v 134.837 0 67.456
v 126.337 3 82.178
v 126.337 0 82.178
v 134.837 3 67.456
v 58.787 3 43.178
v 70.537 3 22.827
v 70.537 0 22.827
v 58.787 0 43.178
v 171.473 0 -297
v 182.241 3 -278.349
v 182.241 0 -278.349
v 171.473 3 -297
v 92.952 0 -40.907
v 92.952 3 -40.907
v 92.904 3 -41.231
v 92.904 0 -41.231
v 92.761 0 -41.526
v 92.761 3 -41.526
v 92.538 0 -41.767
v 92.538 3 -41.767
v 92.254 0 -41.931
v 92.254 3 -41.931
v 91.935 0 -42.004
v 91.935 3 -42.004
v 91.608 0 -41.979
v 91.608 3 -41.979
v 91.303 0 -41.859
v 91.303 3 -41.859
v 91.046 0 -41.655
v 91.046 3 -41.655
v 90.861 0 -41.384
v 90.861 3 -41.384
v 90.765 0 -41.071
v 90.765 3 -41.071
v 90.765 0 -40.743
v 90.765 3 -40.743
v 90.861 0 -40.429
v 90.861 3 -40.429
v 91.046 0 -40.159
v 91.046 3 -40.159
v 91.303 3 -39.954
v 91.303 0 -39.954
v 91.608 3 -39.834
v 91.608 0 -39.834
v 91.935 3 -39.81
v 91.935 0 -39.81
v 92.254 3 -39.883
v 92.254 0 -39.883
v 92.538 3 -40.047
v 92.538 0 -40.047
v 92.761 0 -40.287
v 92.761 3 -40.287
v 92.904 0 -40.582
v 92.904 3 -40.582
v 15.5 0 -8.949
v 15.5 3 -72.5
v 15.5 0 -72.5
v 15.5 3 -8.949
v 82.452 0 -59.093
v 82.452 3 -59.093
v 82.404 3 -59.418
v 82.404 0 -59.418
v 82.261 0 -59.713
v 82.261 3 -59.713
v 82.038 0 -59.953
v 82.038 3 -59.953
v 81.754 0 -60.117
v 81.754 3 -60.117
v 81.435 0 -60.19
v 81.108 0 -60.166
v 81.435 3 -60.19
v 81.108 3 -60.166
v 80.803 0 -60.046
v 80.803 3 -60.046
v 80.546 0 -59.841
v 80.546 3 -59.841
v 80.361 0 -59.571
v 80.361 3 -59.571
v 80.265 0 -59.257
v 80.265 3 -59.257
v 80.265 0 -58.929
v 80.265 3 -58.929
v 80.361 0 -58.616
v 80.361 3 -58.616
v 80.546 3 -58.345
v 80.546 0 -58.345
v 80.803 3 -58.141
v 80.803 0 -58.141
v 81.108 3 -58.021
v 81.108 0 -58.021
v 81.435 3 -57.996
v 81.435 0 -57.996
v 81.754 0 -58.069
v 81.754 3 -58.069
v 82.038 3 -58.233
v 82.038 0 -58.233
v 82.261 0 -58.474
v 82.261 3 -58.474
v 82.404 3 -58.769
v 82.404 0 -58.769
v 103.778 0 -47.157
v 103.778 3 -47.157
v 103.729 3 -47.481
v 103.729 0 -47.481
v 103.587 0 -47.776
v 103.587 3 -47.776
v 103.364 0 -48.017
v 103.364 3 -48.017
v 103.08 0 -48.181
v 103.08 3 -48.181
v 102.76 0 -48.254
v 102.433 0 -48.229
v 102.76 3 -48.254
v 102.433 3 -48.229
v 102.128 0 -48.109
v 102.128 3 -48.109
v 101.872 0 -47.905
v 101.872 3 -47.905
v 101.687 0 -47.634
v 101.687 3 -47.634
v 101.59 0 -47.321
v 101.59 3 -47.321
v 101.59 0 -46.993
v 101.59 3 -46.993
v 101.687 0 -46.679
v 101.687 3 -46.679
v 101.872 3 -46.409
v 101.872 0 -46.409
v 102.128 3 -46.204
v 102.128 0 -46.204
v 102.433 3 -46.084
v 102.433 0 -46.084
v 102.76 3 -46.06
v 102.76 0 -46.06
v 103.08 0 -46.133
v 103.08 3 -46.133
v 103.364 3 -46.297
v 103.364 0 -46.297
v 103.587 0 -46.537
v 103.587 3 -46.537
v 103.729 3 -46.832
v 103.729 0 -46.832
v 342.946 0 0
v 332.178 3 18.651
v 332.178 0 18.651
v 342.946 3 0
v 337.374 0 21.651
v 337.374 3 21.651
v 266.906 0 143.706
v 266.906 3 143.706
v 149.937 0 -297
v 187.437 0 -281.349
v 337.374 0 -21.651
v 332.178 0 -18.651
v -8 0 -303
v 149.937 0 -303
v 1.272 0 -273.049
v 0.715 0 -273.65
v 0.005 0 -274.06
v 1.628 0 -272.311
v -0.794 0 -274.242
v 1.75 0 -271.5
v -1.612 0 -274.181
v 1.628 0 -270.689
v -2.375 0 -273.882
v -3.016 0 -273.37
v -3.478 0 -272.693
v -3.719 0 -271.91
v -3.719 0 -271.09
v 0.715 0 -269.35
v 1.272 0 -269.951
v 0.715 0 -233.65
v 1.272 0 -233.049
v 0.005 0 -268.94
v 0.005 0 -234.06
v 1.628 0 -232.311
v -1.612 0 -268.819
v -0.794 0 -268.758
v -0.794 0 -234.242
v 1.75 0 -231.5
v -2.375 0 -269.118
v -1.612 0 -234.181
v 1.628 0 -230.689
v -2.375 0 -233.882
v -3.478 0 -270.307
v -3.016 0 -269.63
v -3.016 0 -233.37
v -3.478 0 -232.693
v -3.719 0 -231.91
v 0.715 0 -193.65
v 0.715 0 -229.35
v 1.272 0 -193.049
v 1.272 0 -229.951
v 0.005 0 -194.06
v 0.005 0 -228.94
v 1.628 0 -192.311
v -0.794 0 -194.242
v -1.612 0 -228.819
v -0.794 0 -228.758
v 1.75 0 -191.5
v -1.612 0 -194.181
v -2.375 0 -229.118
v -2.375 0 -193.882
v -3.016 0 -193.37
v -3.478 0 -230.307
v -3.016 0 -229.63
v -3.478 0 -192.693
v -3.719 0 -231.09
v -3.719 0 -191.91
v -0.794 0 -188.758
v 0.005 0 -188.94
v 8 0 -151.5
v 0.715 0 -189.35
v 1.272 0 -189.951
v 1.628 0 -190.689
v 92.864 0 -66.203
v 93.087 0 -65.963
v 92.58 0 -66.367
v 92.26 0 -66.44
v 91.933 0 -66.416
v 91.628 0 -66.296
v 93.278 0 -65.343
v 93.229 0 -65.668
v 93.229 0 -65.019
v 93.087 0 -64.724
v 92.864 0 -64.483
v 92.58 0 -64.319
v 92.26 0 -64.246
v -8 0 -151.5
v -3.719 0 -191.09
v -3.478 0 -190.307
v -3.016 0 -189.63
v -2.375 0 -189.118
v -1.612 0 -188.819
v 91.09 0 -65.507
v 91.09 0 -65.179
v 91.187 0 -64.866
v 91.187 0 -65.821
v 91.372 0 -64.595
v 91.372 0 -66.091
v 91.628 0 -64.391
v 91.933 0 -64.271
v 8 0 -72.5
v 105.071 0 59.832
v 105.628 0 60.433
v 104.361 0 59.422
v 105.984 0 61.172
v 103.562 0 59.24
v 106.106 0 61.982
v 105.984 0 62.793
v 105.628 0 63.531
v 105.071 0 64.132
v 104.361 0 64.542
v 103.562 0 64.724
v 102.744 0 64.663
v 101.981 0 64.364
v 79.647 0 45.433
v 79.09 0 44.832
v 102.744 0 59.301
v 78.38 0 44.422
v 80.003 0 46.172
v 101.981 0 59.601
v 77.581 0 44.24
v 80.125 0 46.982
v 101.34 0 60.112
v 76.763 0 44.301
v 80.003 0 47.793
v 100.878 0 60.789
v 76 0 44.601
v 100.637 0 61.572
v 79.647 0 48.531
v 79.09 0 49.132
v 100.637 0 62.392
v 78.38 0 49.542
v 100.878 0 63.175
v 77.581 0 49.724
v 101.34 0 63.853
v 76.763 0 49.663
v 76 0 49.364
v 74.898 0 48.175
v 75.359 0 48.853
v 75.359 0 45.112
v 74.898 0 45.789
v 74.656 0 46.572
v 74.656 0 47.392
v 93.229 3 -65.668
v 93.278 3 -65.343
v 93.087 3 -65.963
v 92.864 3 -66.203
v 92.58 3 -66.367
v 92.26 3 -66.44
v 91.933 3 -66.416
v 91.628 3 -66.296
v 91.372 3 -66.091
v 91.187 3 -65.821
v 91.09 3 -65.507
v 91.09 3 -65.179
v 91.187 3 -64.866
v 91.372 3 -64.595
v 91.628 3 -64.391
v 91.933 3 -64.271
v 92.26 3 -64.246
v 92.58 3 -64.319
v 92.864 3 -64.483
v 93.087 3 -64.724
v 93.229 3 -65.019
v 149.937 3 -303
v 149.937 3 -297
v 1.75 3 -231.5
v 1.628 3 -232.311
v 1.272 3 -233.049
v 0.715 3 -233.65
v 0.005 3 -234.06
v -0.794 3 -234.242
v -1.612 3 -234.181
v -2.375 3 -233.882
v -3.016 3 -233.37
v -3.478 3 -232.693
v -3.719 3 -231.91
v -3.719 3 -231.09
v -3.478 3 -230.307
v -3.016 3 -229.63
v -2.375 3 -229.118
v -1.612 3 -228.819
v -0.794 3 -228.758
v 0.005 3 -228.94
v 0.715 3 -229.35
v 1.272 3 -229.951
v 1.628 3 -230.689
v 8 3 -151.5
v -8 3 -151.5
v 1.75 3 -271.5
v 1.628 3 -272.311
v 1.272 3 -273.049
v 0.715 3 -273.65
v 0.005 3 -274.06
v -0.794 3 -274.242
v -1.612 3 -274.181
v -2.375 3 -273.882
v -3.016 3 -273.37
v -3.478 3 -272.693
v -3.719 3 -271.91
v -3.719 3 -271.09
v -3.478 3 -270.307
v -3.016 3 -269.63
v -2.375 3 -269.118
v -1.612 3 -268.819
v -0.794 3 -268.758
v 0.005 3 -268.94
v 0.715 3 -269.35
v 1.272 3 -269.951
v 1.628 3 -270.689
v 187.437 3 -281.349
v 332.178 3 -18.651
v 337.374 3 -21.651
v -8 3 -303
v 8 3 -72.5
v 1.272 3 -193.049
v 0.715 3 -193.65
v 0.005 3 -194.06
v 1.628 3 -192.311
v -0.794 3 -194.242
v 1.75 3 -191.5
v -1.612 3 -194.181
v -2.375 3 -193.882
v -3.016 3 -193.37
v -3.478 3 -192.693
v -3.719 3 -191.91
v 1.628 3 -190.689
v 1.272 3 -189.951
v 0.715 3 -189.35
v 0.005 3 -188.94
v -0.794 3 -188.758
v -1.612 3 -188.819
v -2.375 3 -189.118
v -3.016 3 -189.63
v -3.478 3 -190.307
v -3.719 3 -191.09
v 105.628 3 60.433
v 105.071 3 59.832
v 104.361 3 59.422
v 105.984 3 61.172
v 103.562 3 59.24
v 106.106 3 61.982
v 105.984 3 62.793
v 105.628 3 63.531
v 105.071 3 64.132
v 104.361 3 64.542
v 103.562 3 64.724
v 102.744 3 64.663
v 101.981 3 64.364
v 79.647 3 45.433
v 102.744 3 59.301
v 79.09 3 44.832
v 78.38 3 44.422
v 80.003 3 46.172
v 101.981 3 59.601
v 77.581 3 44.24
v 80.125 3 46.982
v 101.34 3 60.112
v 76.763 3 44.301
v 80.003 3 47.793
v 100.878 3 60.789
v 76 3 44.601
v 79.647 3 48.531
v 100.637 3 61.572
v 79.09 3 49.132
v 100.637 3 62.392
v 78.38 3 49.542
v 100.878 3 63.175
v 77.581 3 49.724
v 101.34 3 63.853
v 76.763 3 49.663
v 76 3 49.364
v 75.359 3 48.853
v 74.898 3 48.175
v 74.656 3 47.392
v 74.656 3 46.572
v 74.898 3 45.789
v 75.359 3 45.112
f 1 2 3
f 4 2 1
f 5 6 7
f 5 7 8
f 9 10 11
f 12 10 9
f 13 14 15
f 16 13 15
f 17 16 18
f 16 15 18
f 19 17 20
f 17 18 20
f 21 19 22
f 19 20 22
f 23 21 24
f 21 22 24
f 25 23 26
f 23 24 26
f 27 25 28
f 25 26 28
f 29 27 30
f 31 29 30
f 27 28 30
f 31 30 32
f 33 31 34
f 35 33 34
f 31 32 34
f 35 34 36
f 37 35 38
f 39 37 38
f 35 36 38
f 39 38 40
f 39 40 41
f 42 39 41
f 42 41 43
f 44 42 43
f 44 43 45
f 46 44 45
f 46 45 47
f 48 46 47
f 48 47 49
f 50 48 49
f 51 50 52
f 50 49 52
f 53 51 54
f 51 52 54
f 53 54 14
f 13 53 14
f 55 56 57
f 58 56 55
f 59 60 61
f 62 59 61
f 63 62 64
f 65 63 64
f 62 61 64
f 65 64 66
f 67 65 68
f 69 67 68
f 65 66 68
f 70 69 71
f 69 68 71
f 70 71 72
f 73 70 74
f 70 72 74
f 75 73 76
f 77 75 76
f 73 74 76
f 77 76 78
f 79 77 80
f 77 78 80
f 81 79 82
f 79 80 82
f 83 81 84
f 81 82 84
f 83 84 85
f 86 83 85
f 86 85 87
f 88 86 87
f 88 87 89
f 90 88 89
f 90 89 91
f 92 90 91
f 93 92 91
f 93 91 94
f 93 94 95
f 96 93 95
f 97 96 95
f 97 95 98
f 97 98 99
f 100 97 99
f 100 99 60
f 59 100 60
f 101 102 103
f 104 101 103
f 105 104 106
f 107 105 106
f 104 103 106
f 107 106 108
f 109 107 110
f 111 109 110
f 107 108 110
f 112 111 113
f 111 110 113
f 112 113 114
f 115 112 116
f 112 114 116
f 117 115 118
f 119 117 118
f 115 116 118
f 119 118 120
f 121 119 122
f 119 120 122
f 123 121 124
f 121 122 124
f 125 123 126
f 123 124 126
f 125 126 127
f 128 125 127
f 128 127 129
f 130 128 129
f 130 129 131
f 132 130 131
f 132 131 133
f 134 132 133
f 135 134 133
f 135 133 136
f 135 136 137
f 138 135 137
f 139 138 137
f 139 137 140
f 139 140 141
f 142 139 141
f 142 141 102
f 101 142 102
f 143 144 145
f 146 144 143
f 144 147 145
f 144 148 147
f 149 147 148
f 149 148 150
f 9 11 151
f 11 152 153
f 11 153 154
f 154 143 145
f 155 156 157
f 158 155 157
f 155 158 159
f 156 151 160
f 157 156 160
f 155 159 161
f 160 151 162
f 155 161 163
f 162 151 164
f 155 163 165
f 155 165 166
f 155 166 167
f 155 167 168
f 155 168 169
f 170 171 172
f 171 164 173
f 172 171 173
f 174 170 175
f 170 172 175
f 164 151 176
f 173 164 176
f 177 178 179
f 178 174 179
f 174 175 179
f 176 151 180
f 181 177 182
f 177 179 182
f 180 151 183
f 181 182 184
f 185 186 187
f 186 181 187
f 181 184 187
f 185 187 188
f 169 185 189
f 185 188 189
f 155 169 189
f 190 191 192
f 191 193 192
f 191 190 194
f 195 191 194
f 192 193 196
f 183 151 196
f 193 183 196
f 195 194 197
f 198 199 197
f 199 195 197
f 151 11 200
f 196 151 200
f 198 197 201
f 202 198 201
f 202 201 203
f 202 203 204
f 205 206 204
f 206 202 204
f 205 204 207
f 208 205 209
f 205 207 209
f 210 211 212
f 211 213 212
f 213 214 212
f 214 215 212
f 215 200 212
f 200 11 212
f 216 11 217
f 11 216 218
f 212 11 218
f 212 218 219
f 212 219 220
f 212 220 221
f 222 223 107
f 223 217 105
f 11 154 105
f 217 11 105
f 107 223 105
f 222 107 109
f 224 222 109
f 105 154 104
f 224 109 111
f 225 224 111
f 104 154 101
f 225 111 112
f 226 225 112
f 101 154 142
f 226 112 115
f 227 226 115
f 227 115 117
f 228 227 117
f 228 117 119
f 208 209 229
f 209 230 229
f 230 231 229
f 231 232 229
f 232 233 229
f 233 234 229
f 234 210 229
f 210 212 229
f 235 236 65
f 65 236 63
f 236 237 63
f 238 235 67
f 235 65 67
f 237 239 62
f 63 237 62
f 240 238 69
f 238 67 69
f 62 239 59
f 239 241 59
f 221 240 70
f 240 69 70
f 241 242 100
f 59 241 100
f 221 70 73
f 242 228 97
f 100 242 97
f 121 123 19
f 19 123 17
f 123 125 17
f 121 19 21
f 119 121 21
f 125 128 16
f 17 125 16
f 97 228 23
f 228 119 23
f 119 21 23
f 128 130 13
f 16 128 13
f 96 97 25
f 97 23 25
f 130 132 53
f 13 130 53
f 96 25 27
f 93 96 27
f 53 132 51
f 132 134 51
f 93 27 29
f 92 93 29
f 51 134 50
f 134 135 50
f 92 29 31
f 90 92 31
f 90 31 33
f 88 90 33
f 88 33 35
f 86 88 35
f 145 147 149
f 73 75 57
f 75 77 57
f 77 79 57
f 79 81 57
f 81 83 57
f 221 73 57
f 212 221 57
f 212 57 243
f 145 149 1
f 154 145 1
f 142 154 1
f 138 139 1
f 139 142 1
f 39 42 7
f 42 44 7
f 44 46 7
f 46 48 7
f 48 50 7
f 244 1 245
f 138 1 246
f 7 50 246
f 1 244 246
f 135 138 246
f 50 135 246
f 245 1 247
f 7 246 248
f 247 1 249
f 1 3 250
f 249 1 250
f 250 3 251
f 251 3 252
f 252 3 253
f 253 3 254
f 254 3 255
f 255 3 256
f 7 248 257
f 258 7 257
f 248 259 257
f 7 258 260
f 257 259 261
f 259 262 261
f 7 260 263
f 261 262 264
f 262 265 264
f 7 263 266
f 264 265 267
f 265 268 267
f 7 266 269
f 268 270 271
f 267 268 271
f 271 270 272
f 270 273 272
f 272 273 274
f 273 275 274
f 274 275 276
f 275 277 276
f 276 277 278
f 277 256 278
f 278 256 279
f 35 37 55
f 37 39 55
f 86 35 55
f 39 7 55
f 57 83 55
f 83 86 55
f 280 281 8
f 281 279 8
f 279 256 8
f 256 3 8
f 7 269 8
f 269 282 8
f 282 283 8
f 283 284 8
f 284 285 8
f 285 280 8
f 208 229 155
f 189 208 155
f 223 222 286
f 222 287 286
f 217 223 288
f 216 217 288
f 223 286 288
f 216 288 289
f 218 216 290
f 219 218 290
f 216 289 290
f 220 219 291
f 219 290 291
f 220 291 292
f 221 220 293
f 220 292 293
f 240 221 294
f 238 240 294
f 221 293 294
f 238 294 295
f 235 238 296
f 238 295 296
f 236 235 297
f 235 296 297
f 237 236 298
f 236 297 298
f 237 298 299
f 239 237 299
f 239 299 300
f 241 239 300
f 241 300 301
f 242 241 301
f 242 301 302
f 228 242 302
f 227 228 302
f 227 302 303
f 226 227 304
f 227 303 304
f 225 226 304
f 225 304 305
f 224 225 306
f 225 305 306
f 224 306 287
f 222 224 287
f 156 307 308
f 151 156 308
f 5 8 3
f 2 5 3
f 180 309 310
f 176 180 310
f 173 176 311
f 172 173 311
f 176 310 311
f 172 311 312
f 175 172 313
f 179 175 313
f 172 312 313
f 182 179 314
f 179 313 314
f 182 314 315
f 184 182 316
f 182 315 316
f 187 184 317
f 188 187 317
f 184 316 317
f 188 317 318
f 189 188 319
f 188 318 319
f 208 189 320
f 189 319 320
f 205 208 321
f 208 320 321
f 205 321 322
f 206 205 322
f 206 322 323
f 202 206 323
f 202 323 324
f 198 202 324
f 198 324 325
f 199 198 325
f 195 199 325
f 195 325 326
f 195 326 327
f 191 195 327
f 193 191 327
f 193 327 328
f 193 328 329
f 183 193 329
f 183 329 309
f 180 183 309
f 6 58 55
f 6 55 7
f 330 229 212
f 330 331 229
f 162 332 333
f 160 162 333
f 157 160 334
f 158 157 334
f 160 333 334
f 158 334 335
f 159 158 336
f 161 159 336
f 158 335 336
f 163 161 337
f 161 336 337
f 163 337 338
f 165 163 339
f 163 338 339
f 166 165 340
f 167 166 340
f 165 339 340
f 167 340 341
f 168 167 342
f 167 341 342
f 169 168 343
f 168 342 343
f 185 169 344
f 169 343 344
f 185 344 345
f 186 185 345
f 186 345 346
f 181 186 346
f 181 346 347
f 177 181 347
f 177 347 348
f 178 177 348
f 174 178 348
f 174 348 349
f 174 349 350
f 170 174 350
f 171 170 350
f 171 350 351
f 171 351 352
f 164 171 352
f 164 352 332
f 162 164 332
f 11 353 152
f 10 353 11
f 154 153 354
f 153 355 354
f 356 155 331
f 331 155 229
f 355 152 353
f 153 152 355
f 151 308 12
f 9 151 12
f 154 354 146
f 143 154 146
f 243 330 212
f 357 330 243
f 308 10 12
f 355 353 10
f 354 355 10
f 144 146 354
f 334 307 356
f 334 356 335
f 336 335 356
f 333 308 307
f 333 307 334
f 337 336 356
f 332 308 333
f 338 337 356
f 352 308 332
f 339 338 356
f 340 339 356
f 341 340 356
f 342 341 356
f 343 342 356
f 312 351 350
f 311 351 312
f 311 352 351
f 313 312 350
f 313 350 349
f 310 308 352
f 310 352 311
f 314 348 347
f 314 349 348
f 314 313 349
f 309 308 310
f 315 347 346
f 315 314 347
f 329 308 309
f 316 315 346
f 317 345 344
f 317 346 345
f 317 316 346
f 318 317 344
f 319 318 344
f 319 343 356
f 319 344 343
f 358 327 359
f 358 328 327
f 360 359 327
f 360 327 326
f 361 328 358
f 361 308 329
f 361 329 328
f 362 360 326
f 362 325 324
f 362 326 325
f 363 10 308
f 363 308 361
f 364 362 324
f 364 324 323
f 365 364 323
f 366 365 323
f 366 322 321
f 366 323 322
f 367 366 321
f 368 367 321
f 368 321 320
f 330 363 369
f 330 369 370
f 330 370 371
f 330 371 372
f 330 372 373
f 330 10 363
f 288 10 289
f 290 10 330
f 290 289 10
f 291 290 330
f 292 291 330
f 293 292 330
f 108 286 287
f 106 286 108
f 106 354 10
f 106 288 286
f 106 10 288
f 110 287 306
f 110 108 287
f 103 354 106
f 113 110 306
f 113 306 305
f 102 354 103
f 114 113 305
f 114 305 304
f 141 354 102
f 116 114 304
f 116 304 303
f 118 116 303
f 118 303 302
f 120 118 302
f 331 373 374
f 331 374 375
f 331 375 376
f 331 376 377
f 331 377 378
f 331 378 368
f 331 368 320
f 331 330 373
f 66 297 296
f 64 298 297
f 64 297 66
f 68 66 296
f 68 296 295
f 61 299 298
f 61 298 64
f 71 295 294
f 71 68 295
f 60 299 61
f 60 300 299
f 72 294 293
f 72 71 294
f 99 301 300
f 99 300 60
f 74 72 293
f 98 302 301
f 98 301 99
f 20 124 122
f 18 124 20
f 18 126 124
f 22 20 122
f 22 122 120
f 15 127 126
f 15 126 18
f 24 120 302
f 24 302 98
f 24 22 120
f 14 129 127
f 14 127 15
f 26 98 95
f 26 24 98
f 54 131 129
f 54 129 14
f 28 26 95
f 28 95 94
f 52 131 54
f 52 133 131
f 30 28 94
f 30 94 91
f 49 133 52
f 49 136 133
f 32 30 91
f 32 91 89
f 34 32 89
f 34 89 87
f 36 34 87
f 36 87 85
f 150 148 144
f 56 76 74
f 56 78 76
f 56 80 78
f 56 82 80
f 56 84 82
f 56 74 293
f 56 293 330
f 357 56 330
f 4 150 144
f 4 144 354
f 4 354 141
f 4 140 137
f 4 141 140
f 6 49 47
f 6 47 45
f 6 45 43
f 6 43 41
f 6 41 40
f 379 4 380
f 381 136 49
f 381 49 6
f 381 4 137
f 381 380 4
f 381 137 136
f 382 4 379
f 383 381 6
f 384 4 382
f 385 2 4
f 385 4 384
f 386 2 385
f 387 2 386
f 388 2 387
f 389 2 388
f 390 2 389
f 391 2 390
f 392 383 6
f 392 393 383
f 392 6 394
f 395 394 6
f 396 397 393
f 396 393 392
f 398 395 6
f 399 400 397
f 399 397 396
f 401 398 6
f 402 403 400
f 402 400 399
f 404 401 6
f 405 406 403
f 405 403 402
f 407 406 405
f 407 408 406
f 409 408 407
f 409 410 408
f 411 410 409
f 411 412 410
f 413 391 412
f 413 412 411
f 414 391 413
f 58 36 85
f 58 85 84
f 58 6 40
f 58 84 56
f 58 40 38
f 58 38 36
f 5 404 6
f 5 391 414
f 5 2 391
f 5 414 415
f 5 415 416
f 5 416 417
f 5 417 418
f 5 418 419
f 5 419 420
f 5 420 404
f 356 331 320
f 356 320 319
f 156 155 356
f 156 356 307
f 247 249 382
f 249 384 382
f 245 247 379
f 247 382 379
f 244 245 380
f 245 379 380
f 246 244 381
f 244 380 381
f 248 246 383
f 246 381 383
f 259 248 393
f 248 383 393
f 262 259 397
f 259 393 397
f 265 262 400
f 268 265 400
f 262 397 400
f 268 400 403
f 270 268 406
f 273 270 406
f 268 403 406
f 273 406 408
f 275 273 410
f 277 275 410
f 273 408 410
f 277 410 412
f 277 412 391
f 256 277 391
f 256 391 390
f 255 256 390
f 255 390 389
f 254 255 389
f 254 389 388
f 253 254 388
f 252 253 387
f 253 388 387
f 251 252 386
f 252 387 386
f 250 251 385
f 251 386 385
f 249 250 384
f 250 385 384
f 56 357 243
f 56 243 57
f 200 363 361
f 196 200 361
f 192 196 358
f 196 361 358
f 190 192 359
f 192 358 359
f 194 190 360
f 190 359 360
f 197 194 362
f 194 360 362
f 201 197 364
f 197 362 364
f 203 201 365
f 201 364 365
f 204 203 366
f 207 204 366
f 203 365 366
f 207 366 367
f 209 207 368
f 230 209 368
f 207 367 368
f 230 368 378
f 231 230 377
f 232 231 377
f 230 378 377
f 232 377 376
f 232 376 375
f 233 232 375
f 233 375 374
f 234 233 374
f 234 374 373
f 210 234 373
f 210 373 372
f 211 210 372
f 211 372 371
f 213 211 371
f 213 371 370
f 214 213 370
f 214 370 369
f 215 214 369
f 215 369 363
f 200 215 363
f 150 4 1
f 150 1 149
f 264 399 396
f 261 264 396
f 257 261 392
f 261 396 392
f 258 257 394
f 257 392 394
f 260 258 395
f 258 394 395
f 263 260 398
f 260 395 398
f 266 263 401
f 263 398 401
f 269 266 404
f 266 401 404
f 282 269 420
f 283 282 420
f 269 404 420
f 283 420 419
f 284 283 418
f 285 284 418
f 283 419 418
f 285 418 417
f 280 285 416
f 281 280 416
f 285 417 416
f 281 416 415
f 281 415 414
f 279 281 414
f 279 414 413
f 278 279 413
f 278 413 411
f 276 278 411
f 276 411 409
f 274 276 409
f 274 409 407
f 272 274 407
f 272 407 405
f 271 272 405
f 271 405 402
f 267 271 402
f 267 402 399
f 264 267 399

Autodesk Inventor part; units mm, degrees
ref_plane "YZ Plane" through (0, 0, 0) normal (1, 0, 0) x (0, 1, 0)
ref_plane "XZ Plane" through (0, 0, 0) normal (0, 1, 0) x (-1, 0, 0)
ref_plane "XY Plane" through (0, 0, 0) normal (0, 0, 1) x (1, 0, 0)
sketch "Sketch1" plane through (0, 0, 0) normal (0, 1, 0) x (-1, 0, 0)
  line L0 (349.8743, 0) -> (258.4057, -158.4282)
  line L1 (174.9371, -303) -> (-174.9371, -303)
  line L2 (-174.9371, -303) -> (-349.8743, 0)
  line L3 (-349.8743, 0) -> (-174.9371, 303)
  line L4 (-174.9371, 303) -> (174.9371, 303)
  line L5 (258.4057, 158.4282) -> (349.8743, 0)
  line L6 (0, 0) -> (-8, 0)
  line L7 (-8, 0) -> (-8, -303)
  line L8 (-8, -303) -> (8, -303)
  line L9 (8, -303) -> (8, 0)
  line L10 (8, 0) -> (-8, 0)
  circle A0 centre (0, 0) radius 2.5
  line L11 (258.4057, 158.4282) -> (-4, 6.9282)
  line L12 (4, -6.9282) -> (266.4057, 144.5718)
  line L13 (-4, 6.9282) -> (4, -6.9282)
  line L14 (-266.4057, 144.5718) -> (-4, -6.9282)
  line L15 (4, 6.9282) -> (-258.4057, 158.4282)
  line L16 (-4, -6.9282) -> (4, 6.9282)
  line L17 (8, -4.6188) -> (8, -151.5)
  line L18 (8, -151.5) -> (-8, -151.5)
  line L19 (-8, -151.5) -> (-8, -303)
  line L20 (-8, -4.6188) -> (-4, -6.9282)
  line L21 (4, -6.9282) -> (-4, -6.9282)
  line L22 (-266.4057, 144.5718) -> (-258.4057, 158.4282)
  line L23 (-127.2028, 82.6782) -> (-135.2028, 68.8218)
  line L24 (-135.2028, 68.8218) -> (-8, -4.6188)
  line L25 (-266.4057, 144.5718) -> (-349.8743, 0)
  line L26 (-174.9371, -303) -> (-349.8743, 0)
  line L27 (-174.9371, -303) -> (-8, -303)
  line L28 (0, 9.2376) -> (8, 0)
  dimension "d0" = 303
  dimension "d1" = 303
  dimension "d2" = 8
  dimension "d3" = 16
  dimension "d4" = 5
  dimension "d7" = 360
extrude "Extrusion1" add sketch "Sketch1" along normal blind 3 contours L1 L7 L18 L9 | L1 L2 L3 L14 L7 | L18 L7 L14 L21 L12 L9 | L12 L13 A0 L10 L9 | L14 L23 L15 L11 L13 A0 L6 L7 | L7 L6 A0 L16 L14 | L10 A0 L16 L28 | L21 L16 A0 L13 | L3 L15 L23 L14 | A0 L13 L10 | L10 L16 A0 | L28 L15 L16 | L16 A0 L13 L11 L28 | A0 L16 L13 | A0 L13 L6 | L6 L16 A0 | L13 A0 L16
sketch "Sketch2" plane through (0, 3, 0) normal (0, 1, 0) x (1, 0, 0)
  line L0 (-8, 303) -> (-8, 0) projected
  line L1 (-8, 0) -> (-8, 151.5)
  line L2 (-8, 151.5) -> (8, 151.5)
  line L3 (8, 151.5) -> (8, 0)
  line L4 (8, 0) -> (-8, 0)
  line L5 (0, -9.2376) -> (258.4057, -158.4282) projected
  line L6 (258.4057, -158.4282) -> (126.3368, -82.1782)
  line L7 (126.3368, -82.1782) -> (134.8368, -67.4558)
  line L8 (134.8368, -67.4558) -> (266.9057, -143.7058)
  line L9 (266.9057, -143.7058) -> (258.4057, -158.4282)
  point P0 (0, 0)
  dimension "d11" = 151.5
  dimension "d12" = 16
  dimension "d13" = 152.5
  dimension "d14" = 17
extrude "Extrusion2" cut sketch "Sketch2" against normal blind 3
sketch "Sketch3" plane through (0, 3, 0) normal (0, 1, 0) x (1, 0, 0)
  line L0 (174.9371, 303) -> (-8, 303) projected
  line L1 (174.9371, 303) -> (149.9371, 303)
  line L2 (149.9371, 303) -> (149.9371, 297)
  line L3 (149.9371, 297) -> (174.9371, 297)
  line L4 (174.9371, 297) -> (174.9371, 303)
  line L5 (349.8743, 0) -> (174.9371, 303) projected
  line L6 (174.9371, 303) -> (187.4371, 281.3494)
  line L7 (187.4371, 281.3494) -> (182.241, 278.3494)
  line L8 (182.241, 278.3494) -> (169.741, 300)
  line L9 (169.741, 300) -> (174.9371, 303)
  line L10 (349.8743, 0) -> (337.3743, 21.6506)
  line L11 (337.3743, 21.6506) -> (332.1781, 18.6506)
  line L12 (332.1781, 18.6506) -> (344.6781, -3)
  line L13 (344.6781, -3) -> (349.8743, 0)
  line L14 (349.8743, 0) -> (337.3743, -21.6506)
  line L15 (337.3743, -21.6506) -> (332.1781, -18.6506)
  line L16 (332.1781, -18.6506) -> (344.6781, 3)
  line L17 (344.6781, 3) -> (349.8743, 0)
  line L18 (349.8743, 0) -> (266.9057, -143.7058) projected
  line L19 (349.8743, 0) -> (374.8743, 0) construction
  point P0 (0, 0)
  dimension "d17" = 25
  dimension "d18" = 6
  dimension "d19" = 25
  dimension "d20" = 6
  dimension "d21" = 25
  dimension "d22" = 6
  dimension "d23" = 25
  dimension "d24" = 120
  dimension "d25" = 6
extrude "Extrusion3" cut sketch "Sketch3" against normal blind 3
sketch "Sketch4" plane through (0, 3, 0) normal (0, 1, 0) x (1, 0, 0)
  line L0 (-55.0368, 49.6734) -> (70.5368, -22.8266)
  line L1 (70.5368, -22.8266) -> (55.0368, -49.6734)
  line L2 (55.0368, -49.6734) -> (-70.5368, 22.8266)
  line L3 (-70.5368, 22.8266) -> (-55.0368, 49.6734)
  line L4 (-55.0368, 49.6734) -> (55.0368, -49.6734) construction
  line L5 (70.5368, -22.8266) -> (-70.5368, 22.8266) construction
  line L6 (-55.0368, 49.6734) -> (89.9632, 49.6734) construction
  line L7 (-15.5, -72.5) -> (-15.5, 72.5)
  line L8 (-15.5, 72.5) -> (15.5, 72.5)
  line L9 (15.5, 72.5) -> (15.5, -72.5)
  line L10 (15.5, -72.5) -> (-15.5, -72.5)
  line L11 (-15.5, -72.5) -> (15.5, 72.5) construction
  line L12 (-15.5, 72.5) -> (15.5, -72.5) construction
  line L13 (-8, 0) -> (8, 0) projected
  line L14 (-15.5, -72.5) -> (129.5, -72.5) construction
  point P0 (0, 0)
  dimension "d28" = 145
  dimension "d29" = 30
  dimension "d30" = 31
  dimension "d31" = 145
  dimension "d32" = 90
  dimension "d33" = 31
extrude "Extrusion4" cut sketch "Sketch4" against normal blind 3
sketch "Sketch5" plane through (0, 3, 0) normal (0, 1, 0) x (1, 0, 0)
  line L0 (-1, 151.5) -> (-1, 191.5)
  circle A0 centre (-1, 191.5) radius 2.75
  circle A1 centre (-1, 231.5) radius 2.75
  circle A2 centre (-1, 271.5) radius 2.75
  circle A3 centre (0, 0) radius 0.5
  line L1 (126.3368, -82.1782) -> (134.8368, -67.4558) projected
  line L2 (126.3368, -82.1782) -> (129.3368, -76.9821)
  line L3 (129.3368, -76.9821) -> (103.3561, -61.9821)
  line L4 (103.3561, -61.9821) -> (77.3753, -46.9821)
  circle A4 centre (103.3561, -61.9821) radius 2.75
  circle A5 centre (77.3753, -46.9821) radius 2.75
  line L5 (-8, 303) -> (-8, 151.5) projected
  dimension "d36" = 40
  dimension "d37" = 5.5
  dimension "d40" = 40
  dimension "d45" = 1
  dimension "d46" = 6
  dimension "d47" = 30
  dimension "d48" = 30
  dimension "d49" = 5.5
  dimension "d50" = 5.5
  dimension "d53" = 7
extrude "Extrusion5" cut sketch "Sketch5" against normal blind 3 contours A0 | A1 | A2 | A4 L4 L3 | A5 | L3 L4 A4
sketch "Sketch6" plane through (0, 3, 0) normal (0, 1, 0) x (1, 0, 0)
  line L0 (-8, 303) -> (-8, 151.5) projected
  line L1 (-8, 303) -> (344, 303)
  line L2 (344, 303) -> (344, -147)
  line L3 (344, -147) -> (-8, -147)
  line L4 (-8, -147) -> (-8, 303)
  point P0 (0, 0)
  dimension "d54" = 352
  dimension "d55" = 450
sketch "Sketch7" plane through (0, 3, 0) normal (0, 1, 0) x (1, 0, 0)
  line L0 (0, 0) -> (86.6025, 50)
  line L1 (0, 0) -> (100, 0) construction
  line L2 (86.6025, 50) -> (91.8525, 40.9067)
  circle A0 centre (91.8525, 40.9067) radius 1.1
  line L3 (86.6025, 50) -> (89.2006, 51.5)
  line L4 (86.6025, 50) -> (89.6025, 50) construction
  circle A1 centre (81.3525, 59.0933) radius 1.1
  circle A2 centre (102.6779, 47.1567) radius 1.1
  circle A3 centre (92.1779, 65.3433) radius 1.1
  dimension "d56" = 100
  dimension "d57" = 30
  dimension "d58" = 10.5
  dimension "d59" = 90
  dimension "d60" = 2.2
  dimension "d61" = 3
  dimension "d62" = 30
  dimension "d65" = 21
  dimension "d68" = 12.5
extrude "Extrusion6" cut sketch "Sketch7" against normal blind 5
properties part number "Acrylic_bottom_camera"
